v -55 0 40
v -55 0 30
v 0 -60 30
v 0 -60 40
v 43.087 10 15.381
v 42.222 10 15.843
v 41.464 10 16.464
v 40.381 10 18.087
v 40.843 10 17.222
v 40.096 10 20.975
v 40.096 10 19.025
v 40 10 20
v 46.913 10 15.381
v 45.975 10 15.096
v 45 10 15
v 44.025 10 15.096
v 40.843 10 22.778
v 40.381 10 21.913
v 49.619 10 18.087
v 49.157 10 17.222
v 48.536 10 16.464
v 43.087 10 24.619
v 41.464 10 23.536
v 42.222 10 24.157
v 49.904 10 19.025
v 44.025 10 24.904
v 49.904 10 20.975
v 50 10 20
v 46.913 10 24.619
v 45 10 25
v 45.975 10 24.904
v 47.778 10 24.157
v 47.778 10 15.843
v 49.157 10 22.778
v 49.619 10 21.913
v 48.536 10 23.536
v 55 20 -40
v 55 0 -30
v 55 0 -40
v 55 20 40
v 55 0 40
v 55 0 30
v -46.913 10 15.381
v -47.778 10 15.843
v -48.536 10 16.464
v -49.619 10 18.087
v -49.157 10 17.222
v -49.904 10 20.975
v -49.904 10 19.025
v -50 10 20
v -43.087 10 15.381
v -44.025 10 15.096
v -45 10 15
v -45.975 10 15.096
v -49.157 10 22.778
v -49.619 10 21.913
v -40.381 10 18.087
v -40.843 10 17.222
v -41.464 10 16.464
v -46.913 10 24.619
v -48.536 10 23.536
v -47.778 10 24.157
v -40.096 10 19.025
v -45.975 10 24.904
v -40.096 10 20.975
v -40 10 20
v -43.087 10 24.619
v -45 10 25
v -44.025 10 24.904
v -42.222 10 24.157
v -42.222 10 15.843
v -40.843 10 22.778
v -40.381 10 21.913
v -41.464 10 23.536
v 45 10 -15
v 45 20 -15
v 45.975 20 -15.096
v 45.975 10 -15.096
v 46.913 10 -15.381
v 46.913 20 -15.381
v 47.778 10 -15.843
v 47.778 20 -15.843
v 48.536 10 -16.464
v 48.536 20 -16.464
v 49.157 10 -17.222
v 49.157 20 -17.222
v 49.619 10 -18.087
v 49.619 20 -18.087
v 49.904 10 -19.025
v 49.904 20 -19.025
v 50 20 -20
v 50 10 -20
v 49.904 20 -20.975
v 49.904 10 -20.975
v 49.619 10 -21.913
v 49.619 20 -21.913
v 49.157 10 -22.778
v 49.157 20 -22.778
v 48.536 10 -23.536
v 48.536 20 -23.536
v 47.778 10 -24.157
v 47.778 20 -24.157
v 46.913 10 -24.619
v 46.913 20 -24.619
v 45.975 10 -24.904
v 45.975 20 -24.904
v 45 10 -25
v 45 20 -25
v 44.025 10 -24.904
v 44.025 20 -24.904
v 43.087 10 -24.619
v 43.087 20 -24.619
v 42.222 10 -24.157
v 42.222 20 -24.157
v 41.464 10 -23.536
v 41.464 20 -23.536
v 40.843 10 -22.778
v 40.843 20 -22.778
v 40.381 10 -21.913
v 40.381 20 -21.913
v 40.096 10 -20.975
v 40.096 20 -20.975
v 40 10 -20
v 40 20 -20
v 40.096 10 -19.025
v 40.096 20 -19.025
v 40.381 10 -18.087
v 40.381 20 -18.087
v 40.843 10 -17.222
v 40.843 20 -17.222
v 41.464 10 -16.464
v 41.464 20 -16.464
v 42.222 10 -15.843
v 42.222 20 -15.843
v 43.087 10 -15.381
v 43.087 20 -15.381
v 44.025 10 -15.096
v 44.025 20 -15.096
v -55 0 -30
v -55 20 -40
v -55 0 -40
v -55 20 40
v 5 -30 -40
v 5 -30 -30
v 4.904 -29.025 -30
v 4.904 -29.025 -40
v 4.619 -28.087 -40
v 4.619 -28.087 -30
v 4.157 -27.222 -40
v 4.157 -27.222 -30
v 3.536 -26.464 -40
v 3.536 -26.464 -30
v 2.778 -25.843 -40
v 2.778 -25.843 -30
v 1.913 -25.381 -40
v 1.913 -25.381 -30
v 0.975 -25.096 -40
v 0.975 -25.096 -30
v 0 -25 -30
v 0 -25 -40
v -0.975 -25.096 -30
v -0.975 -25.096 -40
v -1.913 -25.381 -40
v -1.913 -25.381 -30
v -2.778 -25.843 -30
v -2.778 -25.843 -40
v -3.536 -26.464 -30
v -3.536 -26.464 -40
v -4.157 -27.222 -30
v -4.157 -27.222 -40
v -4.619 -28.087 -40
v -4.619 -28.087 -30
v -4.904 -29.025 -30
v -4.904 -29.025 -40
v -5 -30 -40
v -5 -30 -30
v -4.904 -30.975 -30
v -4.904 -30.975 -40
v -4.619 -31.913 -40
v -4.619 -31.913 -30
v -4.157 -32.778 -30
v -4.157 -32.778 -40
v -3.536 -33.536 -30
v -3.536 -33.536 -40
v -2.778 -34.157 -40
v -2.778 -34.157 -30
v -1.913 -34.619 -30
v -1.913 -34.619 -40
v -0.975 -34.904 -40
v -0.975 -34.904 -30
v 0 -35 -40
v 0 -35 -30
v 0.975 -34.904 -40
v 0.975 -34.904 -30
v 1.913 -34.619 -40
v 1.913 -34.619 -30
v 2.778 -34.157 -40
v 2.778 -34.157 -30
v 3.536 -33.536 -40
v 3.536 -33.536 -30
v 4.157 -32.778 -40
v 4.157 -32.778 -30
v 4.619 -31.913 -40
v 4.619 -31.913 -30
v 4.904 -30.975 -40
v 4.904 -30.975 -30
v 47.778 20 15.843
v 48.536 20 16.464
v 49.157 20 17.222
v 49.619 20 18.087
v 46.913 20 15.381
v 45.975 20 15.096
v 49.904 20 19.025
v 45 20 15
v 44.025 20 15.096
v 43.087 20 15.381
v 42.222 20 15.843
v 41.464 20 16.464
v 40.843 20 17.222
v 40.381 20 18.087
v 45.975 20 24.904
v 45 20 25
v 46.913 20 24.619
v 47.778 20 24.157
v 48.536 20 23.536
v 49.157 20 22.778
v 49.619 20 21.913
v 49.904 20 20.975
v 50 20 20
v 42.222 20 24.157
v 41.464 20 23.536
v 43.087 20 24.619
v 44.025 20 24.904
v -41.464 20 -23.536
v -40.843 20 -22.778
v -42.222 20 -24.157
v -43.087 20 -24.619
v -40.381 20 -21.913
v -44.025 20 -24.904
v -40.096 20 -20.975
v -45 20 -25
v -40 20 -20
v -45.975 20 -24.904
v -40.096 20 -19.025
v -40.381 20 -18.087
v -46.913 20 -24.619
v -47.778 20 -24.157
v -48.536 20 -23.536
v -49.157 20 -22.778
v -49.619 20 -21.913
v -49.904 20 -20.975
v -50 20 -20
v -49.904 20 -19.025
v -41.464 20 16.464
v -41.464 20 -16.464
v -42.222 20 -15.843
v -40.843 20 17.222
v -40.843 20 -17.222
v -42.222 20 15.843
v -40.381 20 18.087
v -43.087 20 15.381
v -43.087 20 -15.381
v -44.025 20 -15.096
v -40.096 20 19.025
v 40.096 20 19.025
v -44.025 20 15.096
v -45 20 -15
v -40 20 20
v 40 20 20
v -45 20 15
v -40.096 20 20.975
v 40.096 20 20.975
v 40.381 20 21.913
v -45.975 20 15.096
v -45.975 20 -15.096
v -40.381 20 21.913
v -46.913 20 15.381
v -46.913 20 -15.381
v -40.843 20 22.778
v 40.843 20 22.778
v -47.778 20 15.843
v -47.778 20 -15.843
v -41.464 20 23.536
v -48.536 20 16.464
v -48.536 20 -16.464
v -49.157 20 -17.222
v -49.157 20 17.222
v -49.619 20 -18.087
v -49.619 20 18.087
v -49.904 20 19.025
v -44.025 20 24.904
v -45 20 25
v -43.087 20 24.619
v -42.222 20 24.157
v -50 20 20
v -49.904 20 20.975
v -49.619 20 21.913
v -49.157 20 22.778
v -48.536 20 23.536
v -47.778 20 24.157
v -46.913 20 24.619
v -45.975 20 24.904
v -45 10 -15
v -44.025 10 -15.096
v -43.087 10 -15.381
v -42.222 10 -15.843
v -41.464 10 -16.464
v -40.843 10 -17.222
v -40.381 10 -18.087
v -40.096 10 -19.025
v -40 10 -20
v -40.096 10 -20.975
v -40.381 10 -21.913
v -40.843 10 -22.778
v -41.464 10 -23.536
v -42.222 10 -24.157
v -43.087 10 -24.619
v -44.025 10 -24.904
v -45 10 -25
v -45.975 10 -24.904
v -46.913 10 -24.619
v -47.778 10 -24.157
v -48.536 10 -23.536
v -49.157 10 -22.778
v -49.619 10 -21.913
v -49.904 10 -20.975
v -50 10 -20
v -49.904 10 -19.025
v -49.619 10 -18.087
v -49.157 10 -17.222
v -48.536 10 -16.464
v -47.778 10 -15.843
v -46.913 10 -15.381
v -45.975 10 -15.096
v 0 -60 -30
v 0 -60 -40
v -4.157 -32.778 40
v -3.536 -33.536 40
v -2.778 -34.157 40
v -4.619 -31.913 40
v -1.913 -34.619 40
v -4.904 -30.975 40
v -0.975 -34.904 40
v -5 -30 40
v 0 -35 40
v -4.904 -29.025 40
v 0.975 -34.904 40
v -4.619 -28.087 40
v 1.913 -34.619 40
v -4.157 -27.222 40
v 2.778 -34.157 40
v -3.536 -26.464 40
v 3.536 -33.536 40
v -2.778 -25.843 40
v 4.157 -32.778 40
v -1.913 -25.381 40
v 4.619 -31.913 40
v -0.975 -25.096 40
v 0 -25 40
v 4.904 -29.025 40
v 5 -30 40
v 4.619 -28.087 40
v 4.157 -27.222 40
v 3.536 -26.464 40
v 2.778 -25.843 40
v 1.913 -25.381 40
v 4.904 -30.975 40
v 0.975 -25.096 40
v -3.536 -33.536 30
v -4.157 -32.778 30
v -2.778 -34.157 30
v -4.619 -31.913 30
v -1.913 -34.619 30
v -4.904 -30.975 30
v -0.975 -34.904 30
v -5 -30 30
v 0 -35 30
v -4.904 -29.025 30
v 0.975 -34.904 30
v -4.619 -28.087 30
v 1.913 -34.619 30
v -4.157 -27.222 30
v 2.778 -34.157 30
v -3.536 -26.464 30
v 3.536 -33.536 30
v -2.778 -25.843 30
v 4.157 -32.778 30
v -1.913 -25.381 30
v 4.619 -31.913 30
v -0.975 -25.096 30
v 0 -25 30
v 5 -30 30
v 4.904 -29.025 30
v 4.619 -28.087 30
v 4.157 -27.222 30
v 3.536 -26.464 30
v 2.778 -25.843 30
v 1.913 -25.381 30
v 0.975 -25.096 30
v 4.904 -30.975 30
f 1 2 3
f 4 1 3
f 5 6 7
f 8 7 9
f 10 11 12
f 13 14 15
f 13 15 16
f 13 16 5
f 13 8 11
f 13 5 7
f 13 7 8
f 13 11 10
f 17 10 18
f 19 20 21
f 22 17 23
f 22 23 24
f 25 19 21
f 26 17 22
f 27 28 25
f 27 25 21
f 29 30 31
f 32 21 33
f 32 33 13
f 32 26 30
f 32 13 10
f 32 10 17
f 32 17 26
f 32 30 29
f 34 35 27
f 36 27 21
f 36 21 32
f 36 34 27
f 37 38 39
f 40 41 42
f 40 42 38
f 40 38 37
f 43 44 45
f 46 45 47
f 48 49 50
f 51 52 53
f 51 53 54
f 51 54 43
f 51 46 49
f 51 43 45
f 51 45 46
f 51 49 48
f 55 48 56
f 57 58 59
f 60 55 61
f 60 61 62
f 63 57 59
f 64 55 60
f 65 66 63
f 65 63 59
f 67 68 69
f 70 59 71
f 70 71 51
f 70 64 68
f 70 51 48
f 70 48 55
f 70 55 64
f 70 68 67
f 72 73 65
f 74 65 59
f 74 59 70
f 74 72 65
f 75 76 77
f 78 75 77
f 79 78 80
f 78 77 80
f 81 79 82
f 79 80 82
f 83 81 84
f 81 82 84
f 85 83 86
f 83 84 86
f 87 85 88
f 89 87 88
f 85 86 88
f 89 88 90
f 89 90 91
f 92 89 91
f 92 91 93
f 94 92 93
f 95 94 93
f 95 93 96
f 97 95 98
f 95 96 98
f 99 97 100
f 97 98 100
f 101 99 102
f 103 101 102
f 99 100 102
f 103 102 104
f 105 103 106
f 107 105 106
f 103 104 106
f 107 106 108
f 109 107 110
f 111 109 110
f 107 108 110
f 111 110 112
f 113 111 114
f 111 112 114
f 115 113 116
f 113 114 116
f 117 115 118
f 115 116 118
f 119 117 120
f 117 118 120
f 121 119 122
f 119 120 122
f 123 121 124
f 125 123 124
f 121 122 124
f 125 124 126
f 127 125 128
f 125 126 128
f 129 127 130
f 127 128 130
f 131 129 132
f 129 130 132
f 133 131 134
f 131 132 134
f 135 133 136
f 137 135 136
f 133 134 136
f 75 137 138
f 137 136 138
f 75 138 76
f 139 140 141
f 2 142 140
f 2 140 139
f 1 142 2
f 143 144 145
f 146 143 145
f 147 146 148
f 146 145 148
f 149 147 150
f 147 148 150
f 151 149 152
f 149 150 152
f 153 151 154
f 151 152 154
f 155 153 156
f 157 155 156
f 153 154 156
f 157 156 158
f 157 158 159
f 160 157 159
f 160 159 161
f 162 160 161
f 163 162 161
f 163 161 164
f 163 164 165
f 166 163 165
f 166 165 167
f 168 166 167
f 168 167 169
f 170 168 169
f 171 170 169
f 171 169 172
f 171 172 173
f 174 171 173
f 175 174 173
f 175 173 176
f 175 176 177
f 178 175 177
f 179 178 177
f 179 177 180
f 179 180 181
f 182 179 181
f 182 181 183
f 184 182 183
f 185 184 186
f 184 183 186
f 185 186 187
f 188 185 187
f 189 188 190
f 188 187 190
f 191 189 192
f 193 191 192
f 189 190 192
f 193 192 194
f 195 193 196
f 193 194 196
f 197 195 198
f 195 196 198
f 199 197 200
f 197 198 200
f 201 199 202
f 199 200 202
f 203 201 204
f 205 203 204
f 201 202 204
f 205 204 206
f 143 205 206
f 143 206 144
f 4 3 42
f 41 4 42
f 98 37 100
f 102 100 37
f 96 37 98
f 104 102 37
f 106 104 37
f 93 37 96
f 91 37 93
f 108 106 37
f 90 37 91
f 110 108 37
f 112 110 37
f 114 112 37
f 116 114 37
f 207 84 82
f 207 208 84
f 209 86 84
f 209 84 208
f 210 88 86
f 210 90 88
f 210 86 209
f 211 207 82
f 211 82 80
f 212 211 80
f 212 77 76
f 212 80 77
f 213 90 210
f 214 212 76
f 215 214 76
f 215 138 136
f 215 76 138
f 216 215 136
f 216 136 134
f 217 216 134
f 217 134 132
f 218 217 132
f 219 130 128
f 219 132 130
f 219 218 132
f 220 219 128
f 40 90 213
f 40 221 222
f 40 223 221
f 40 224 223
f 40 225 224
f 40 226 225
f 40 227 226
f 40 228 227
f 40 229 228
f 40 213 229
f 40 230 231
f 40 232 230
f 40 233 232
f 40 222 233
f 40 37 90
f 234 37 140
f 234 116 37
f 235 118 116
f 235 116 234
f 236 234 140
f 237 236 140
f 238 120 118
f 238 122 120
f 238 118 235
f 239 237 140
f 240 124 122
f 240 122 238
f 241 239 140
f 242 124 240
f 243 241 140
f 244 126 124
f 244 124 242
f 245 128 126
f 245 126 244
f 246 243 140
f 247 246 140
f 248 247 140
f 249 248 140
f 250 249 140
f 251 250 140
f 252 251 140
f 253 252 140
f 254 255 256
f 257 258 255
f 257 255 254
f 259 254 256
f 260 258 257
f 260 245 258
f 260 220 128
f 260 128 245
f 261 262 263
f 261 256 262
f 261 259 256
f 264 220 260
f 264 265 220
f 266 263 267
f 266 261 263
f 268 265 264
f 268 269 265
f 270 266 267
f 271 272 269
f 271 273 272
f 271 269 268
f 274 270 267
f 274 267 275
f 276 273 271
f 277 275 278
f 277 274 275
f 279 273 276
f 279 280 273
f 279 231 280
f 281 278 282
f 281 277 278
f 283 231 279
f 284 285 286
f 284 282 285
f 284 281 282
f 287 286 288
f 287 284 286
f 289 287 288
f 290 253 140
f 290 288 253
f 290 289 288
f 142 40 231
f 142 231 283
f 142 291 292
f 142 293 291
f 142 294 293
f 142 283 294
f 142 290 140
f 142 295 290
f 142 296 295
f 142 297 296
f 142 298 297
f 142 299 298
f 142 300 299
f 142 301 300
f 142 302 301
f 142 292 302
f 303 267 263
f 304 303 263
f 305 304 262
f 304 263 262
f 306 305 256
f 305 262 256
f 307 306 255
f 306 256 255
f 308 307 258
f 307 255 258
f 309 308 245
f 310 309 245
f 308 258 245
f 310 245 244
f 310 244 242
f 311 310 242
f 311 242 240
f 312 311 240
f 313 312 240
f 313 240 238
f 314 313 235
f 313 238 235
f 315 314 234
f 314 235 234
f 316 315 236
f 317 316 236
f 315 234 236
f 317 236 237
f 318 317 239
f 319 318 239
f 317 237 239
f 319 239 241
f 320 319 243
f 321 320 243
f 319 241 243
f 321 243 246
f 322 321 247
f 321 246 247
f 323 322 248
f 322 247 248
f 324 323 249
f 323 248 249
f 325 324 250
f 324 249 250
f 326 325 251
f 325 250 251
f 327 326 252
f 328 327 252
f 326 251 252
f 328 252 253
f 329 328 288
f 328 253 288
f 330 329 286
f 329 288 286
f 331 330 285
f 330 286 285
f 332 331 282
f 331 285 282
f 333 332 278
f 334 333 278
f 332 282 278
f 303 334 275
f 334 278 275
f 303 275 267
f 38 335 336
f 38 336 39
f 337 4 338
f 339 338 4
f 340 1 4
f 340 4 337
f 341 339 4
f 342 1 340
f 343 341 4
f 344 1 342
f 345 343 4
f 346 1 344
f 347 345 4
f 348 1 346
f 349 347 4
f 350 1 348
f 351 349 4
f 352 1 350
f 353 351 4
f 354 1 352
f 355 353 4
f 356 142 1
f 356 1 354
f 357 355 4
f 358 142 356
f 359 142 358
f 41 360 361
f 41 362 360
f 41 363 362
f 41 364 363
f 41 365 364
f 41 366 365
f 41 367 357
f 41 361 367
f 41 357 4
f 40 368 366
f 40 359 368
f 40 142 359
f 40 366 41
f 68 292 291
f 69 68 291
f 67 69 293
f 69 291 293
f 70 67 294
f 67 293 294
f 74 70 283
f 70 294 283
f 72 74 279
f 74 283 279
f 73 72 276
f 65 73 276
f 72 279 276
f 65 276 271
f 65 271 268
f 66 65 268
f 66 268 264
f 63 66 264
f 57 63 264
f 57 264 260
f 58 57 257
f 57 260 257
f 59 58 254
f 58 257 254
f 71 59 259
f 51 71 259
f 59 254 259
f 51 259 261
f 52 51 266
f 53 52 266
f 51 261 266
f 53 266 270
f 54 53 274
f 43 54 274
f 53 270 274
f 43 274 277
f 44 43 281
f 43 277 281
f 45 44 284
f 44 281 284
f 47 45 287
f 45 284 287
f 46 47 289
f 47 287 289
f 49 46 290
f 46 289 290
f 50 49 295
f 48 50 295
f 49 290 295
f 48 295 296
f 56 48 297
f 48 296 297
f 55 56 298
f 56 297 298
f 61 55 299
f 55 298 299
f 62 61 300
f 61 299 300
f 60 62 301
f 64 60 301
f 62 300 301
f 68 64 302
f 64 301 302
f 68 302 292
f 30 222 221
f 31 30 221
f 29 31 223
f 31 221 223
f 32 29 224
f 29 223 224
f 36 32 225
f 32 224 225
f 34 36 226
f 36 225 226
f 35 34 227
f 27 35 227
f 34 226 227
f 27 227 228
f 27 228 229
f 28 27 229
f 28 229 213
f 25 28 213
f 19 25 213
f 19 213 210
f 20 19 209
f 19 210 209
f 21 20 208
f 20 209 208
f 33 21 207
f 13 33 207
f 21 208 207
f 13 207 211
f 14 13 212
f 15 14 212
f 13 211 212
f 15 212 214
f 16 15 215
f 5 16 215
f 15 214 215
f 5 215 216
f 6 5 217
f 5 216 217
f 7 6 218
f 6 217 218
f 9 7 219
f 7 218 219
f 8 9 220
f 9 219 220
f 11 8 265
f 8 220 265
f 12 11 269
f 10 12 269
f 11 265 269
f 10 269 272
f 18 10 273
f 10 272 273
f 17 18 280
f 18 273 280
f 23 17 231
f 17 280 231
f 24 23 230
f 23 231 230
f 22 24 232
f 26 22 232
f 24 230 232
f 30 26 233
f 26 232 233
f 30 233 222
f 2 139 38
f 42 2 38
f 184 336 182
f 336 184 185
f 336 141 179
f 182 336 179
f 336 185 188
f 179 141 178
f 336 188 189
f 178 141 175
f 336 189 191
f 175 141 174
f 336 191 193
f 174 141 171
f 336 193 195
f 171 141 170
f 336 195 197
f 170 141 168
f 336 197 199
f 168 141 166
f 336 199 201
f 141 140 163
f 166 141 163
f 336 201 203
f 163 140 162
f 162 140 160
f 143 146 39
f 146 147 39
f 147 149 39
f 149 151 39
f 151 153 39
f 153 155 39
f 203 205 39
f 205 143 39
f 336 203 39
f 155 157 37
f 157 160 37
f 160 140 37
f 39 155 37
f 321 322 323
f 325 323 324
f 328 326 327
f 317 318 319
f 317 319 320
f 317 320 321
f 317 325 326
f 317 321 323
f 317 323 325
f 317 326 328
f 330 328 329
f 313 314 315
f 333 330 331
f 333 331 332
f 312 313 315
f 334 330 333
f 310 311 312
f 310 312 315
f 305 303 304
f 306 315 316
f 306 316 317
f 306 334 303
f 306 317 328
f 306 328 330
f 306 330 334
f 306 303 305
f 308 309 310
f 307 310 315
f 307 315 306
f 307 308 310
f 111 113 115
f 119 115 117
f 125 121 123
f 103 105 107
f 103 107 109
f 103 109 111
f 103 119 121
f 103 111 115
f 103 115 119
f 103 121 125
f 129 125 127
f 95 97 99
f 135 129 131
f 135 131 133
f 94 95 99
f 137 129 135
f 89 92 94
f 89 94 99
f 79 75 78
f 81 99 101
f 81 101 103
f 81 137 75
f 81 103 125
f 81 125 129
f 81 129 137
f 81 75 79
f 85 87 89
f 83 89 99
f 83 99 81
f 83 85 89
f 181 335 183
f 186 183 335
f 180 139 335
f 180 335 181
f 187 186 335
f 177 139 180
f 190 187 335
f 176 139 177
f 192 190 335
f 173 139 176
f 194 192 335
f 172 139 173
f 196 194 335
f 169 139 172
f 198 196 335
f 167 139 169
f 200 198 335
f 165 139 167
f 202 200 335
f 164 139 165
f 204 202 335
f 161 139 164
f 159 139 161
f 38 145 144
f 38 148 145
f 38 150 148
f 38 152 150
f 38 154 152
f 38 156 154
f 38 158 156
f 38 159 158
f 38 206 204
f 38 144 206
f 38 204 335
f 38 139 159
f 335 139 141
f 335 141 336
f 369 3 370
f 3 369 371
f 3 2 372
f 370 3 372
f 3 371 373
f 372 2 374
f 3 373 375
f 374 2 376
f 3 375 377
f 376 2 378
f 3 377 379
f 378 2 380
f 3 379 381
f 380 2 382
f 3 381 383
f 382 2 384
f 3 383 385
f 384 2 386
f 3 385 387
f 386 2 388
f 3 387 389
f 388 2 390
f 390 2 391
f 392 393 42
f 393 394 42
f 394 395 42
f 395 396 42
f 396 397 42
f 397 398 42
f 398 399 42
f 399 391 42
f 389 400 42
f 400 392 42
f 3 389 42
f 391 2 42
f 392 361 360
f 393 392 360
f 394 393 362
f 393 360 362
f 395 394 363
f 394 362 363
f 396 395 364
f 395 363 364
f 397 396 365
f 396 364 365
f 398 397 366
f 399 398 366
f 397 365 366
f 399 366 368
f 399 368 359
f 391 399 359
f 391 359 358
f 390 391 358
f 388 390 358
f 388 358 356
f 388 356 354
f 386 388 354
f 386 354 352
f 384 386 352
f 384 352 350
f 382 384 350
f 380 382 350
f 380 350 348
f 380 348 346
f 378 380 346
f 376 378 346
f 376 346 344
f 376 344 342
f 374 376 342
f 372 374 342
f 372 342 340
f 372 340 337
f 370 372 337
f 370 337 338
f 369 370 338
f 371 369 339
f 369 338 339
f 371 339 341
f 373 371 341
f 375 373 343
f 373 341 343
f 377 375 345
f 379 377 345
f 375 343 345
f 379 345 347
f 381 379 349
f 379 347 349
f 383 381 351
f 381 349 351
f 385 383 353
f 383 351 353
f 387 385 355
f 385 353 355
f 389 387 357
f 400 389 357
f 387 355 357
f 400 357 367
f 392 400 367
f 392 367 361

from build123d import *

# Parameters (mm, degrees)
SKETCH1_W           = 110
SKETCH1_H           = 60
BOSS_EXTRUDE1_DEPTH = 20
SKETCH3_R           = 5
CUT_EXTRUDE1_DEPTH  = 10
BOSS_EXTRUDE2_DEPTH = 10
SKETCH5_R           = 5
CUT_EXTRUDE2_DEPTH  = 115.127122105


with BuildPart() as part:
    # Sketch1 → Boss-Extrude1 (new body)
    with BuildSketch(Plane(origin=(0, 0, 0), x_dir=(1, 0, 0), z_dir=(0, 1, 0))):
        Rectangle(SKETCH1_W, SKETCH1_H)
    extrude(amount=BOSS_EXTRUDE1_DEPTH)

    # Sketch3 → Cut-Extrude1 (cut)
    with BuildSketch(Plane(origin=(0, 20, 0), x_dir=(1, 0, 0), z_dir=(0, 1, 0))):
        with Locations(Location((-45, 20, 0), (0, 0, 270))):
            Circle(SKETCH3_R)
        with Locations(Location((45, 20, 0), (0, 0, 270))):
            Circle(SKETCH3_R)
        with Locations(Location((45, -20, 0), (0, 0, 270))):
            Circle(SKETCH3_R)
        with Locations(Location((-45, -20, 0), (0, 0, 270))):
            Circle(SKETCH3_R)
    extrude(amount=-CUT_EXTRUDE1_DEPTH, mode=Mode.SUBTRACT)

    # Sketch4 → Boss-Extrude2 (add)
    with BuildSketch(Plane.XY.offset(30)):
        Polygon((-55, 0), (0, -60), (55, 0), (55, 20), (-55, 20), align=None)
    boss_extrude2 = extrude(amount=BOSS_EXTRUDE2_DEPTH)

    # Mirror1: Boss-Extrude2 across plane
    add(boss_extrude2.mirror(Plane.XY))

    # Sketch5 → Cut-Extrude2 (cut, through all)
    with BuildSketch(Plane.XY.offset(40)):
        with Locations((0, -30)):
            Circle(SKETCH5_R)
    extrude(amount=-CUT_EXTRUDE2_DEPTH, mode=Mode.SUBTRACT)


solid = part.part
